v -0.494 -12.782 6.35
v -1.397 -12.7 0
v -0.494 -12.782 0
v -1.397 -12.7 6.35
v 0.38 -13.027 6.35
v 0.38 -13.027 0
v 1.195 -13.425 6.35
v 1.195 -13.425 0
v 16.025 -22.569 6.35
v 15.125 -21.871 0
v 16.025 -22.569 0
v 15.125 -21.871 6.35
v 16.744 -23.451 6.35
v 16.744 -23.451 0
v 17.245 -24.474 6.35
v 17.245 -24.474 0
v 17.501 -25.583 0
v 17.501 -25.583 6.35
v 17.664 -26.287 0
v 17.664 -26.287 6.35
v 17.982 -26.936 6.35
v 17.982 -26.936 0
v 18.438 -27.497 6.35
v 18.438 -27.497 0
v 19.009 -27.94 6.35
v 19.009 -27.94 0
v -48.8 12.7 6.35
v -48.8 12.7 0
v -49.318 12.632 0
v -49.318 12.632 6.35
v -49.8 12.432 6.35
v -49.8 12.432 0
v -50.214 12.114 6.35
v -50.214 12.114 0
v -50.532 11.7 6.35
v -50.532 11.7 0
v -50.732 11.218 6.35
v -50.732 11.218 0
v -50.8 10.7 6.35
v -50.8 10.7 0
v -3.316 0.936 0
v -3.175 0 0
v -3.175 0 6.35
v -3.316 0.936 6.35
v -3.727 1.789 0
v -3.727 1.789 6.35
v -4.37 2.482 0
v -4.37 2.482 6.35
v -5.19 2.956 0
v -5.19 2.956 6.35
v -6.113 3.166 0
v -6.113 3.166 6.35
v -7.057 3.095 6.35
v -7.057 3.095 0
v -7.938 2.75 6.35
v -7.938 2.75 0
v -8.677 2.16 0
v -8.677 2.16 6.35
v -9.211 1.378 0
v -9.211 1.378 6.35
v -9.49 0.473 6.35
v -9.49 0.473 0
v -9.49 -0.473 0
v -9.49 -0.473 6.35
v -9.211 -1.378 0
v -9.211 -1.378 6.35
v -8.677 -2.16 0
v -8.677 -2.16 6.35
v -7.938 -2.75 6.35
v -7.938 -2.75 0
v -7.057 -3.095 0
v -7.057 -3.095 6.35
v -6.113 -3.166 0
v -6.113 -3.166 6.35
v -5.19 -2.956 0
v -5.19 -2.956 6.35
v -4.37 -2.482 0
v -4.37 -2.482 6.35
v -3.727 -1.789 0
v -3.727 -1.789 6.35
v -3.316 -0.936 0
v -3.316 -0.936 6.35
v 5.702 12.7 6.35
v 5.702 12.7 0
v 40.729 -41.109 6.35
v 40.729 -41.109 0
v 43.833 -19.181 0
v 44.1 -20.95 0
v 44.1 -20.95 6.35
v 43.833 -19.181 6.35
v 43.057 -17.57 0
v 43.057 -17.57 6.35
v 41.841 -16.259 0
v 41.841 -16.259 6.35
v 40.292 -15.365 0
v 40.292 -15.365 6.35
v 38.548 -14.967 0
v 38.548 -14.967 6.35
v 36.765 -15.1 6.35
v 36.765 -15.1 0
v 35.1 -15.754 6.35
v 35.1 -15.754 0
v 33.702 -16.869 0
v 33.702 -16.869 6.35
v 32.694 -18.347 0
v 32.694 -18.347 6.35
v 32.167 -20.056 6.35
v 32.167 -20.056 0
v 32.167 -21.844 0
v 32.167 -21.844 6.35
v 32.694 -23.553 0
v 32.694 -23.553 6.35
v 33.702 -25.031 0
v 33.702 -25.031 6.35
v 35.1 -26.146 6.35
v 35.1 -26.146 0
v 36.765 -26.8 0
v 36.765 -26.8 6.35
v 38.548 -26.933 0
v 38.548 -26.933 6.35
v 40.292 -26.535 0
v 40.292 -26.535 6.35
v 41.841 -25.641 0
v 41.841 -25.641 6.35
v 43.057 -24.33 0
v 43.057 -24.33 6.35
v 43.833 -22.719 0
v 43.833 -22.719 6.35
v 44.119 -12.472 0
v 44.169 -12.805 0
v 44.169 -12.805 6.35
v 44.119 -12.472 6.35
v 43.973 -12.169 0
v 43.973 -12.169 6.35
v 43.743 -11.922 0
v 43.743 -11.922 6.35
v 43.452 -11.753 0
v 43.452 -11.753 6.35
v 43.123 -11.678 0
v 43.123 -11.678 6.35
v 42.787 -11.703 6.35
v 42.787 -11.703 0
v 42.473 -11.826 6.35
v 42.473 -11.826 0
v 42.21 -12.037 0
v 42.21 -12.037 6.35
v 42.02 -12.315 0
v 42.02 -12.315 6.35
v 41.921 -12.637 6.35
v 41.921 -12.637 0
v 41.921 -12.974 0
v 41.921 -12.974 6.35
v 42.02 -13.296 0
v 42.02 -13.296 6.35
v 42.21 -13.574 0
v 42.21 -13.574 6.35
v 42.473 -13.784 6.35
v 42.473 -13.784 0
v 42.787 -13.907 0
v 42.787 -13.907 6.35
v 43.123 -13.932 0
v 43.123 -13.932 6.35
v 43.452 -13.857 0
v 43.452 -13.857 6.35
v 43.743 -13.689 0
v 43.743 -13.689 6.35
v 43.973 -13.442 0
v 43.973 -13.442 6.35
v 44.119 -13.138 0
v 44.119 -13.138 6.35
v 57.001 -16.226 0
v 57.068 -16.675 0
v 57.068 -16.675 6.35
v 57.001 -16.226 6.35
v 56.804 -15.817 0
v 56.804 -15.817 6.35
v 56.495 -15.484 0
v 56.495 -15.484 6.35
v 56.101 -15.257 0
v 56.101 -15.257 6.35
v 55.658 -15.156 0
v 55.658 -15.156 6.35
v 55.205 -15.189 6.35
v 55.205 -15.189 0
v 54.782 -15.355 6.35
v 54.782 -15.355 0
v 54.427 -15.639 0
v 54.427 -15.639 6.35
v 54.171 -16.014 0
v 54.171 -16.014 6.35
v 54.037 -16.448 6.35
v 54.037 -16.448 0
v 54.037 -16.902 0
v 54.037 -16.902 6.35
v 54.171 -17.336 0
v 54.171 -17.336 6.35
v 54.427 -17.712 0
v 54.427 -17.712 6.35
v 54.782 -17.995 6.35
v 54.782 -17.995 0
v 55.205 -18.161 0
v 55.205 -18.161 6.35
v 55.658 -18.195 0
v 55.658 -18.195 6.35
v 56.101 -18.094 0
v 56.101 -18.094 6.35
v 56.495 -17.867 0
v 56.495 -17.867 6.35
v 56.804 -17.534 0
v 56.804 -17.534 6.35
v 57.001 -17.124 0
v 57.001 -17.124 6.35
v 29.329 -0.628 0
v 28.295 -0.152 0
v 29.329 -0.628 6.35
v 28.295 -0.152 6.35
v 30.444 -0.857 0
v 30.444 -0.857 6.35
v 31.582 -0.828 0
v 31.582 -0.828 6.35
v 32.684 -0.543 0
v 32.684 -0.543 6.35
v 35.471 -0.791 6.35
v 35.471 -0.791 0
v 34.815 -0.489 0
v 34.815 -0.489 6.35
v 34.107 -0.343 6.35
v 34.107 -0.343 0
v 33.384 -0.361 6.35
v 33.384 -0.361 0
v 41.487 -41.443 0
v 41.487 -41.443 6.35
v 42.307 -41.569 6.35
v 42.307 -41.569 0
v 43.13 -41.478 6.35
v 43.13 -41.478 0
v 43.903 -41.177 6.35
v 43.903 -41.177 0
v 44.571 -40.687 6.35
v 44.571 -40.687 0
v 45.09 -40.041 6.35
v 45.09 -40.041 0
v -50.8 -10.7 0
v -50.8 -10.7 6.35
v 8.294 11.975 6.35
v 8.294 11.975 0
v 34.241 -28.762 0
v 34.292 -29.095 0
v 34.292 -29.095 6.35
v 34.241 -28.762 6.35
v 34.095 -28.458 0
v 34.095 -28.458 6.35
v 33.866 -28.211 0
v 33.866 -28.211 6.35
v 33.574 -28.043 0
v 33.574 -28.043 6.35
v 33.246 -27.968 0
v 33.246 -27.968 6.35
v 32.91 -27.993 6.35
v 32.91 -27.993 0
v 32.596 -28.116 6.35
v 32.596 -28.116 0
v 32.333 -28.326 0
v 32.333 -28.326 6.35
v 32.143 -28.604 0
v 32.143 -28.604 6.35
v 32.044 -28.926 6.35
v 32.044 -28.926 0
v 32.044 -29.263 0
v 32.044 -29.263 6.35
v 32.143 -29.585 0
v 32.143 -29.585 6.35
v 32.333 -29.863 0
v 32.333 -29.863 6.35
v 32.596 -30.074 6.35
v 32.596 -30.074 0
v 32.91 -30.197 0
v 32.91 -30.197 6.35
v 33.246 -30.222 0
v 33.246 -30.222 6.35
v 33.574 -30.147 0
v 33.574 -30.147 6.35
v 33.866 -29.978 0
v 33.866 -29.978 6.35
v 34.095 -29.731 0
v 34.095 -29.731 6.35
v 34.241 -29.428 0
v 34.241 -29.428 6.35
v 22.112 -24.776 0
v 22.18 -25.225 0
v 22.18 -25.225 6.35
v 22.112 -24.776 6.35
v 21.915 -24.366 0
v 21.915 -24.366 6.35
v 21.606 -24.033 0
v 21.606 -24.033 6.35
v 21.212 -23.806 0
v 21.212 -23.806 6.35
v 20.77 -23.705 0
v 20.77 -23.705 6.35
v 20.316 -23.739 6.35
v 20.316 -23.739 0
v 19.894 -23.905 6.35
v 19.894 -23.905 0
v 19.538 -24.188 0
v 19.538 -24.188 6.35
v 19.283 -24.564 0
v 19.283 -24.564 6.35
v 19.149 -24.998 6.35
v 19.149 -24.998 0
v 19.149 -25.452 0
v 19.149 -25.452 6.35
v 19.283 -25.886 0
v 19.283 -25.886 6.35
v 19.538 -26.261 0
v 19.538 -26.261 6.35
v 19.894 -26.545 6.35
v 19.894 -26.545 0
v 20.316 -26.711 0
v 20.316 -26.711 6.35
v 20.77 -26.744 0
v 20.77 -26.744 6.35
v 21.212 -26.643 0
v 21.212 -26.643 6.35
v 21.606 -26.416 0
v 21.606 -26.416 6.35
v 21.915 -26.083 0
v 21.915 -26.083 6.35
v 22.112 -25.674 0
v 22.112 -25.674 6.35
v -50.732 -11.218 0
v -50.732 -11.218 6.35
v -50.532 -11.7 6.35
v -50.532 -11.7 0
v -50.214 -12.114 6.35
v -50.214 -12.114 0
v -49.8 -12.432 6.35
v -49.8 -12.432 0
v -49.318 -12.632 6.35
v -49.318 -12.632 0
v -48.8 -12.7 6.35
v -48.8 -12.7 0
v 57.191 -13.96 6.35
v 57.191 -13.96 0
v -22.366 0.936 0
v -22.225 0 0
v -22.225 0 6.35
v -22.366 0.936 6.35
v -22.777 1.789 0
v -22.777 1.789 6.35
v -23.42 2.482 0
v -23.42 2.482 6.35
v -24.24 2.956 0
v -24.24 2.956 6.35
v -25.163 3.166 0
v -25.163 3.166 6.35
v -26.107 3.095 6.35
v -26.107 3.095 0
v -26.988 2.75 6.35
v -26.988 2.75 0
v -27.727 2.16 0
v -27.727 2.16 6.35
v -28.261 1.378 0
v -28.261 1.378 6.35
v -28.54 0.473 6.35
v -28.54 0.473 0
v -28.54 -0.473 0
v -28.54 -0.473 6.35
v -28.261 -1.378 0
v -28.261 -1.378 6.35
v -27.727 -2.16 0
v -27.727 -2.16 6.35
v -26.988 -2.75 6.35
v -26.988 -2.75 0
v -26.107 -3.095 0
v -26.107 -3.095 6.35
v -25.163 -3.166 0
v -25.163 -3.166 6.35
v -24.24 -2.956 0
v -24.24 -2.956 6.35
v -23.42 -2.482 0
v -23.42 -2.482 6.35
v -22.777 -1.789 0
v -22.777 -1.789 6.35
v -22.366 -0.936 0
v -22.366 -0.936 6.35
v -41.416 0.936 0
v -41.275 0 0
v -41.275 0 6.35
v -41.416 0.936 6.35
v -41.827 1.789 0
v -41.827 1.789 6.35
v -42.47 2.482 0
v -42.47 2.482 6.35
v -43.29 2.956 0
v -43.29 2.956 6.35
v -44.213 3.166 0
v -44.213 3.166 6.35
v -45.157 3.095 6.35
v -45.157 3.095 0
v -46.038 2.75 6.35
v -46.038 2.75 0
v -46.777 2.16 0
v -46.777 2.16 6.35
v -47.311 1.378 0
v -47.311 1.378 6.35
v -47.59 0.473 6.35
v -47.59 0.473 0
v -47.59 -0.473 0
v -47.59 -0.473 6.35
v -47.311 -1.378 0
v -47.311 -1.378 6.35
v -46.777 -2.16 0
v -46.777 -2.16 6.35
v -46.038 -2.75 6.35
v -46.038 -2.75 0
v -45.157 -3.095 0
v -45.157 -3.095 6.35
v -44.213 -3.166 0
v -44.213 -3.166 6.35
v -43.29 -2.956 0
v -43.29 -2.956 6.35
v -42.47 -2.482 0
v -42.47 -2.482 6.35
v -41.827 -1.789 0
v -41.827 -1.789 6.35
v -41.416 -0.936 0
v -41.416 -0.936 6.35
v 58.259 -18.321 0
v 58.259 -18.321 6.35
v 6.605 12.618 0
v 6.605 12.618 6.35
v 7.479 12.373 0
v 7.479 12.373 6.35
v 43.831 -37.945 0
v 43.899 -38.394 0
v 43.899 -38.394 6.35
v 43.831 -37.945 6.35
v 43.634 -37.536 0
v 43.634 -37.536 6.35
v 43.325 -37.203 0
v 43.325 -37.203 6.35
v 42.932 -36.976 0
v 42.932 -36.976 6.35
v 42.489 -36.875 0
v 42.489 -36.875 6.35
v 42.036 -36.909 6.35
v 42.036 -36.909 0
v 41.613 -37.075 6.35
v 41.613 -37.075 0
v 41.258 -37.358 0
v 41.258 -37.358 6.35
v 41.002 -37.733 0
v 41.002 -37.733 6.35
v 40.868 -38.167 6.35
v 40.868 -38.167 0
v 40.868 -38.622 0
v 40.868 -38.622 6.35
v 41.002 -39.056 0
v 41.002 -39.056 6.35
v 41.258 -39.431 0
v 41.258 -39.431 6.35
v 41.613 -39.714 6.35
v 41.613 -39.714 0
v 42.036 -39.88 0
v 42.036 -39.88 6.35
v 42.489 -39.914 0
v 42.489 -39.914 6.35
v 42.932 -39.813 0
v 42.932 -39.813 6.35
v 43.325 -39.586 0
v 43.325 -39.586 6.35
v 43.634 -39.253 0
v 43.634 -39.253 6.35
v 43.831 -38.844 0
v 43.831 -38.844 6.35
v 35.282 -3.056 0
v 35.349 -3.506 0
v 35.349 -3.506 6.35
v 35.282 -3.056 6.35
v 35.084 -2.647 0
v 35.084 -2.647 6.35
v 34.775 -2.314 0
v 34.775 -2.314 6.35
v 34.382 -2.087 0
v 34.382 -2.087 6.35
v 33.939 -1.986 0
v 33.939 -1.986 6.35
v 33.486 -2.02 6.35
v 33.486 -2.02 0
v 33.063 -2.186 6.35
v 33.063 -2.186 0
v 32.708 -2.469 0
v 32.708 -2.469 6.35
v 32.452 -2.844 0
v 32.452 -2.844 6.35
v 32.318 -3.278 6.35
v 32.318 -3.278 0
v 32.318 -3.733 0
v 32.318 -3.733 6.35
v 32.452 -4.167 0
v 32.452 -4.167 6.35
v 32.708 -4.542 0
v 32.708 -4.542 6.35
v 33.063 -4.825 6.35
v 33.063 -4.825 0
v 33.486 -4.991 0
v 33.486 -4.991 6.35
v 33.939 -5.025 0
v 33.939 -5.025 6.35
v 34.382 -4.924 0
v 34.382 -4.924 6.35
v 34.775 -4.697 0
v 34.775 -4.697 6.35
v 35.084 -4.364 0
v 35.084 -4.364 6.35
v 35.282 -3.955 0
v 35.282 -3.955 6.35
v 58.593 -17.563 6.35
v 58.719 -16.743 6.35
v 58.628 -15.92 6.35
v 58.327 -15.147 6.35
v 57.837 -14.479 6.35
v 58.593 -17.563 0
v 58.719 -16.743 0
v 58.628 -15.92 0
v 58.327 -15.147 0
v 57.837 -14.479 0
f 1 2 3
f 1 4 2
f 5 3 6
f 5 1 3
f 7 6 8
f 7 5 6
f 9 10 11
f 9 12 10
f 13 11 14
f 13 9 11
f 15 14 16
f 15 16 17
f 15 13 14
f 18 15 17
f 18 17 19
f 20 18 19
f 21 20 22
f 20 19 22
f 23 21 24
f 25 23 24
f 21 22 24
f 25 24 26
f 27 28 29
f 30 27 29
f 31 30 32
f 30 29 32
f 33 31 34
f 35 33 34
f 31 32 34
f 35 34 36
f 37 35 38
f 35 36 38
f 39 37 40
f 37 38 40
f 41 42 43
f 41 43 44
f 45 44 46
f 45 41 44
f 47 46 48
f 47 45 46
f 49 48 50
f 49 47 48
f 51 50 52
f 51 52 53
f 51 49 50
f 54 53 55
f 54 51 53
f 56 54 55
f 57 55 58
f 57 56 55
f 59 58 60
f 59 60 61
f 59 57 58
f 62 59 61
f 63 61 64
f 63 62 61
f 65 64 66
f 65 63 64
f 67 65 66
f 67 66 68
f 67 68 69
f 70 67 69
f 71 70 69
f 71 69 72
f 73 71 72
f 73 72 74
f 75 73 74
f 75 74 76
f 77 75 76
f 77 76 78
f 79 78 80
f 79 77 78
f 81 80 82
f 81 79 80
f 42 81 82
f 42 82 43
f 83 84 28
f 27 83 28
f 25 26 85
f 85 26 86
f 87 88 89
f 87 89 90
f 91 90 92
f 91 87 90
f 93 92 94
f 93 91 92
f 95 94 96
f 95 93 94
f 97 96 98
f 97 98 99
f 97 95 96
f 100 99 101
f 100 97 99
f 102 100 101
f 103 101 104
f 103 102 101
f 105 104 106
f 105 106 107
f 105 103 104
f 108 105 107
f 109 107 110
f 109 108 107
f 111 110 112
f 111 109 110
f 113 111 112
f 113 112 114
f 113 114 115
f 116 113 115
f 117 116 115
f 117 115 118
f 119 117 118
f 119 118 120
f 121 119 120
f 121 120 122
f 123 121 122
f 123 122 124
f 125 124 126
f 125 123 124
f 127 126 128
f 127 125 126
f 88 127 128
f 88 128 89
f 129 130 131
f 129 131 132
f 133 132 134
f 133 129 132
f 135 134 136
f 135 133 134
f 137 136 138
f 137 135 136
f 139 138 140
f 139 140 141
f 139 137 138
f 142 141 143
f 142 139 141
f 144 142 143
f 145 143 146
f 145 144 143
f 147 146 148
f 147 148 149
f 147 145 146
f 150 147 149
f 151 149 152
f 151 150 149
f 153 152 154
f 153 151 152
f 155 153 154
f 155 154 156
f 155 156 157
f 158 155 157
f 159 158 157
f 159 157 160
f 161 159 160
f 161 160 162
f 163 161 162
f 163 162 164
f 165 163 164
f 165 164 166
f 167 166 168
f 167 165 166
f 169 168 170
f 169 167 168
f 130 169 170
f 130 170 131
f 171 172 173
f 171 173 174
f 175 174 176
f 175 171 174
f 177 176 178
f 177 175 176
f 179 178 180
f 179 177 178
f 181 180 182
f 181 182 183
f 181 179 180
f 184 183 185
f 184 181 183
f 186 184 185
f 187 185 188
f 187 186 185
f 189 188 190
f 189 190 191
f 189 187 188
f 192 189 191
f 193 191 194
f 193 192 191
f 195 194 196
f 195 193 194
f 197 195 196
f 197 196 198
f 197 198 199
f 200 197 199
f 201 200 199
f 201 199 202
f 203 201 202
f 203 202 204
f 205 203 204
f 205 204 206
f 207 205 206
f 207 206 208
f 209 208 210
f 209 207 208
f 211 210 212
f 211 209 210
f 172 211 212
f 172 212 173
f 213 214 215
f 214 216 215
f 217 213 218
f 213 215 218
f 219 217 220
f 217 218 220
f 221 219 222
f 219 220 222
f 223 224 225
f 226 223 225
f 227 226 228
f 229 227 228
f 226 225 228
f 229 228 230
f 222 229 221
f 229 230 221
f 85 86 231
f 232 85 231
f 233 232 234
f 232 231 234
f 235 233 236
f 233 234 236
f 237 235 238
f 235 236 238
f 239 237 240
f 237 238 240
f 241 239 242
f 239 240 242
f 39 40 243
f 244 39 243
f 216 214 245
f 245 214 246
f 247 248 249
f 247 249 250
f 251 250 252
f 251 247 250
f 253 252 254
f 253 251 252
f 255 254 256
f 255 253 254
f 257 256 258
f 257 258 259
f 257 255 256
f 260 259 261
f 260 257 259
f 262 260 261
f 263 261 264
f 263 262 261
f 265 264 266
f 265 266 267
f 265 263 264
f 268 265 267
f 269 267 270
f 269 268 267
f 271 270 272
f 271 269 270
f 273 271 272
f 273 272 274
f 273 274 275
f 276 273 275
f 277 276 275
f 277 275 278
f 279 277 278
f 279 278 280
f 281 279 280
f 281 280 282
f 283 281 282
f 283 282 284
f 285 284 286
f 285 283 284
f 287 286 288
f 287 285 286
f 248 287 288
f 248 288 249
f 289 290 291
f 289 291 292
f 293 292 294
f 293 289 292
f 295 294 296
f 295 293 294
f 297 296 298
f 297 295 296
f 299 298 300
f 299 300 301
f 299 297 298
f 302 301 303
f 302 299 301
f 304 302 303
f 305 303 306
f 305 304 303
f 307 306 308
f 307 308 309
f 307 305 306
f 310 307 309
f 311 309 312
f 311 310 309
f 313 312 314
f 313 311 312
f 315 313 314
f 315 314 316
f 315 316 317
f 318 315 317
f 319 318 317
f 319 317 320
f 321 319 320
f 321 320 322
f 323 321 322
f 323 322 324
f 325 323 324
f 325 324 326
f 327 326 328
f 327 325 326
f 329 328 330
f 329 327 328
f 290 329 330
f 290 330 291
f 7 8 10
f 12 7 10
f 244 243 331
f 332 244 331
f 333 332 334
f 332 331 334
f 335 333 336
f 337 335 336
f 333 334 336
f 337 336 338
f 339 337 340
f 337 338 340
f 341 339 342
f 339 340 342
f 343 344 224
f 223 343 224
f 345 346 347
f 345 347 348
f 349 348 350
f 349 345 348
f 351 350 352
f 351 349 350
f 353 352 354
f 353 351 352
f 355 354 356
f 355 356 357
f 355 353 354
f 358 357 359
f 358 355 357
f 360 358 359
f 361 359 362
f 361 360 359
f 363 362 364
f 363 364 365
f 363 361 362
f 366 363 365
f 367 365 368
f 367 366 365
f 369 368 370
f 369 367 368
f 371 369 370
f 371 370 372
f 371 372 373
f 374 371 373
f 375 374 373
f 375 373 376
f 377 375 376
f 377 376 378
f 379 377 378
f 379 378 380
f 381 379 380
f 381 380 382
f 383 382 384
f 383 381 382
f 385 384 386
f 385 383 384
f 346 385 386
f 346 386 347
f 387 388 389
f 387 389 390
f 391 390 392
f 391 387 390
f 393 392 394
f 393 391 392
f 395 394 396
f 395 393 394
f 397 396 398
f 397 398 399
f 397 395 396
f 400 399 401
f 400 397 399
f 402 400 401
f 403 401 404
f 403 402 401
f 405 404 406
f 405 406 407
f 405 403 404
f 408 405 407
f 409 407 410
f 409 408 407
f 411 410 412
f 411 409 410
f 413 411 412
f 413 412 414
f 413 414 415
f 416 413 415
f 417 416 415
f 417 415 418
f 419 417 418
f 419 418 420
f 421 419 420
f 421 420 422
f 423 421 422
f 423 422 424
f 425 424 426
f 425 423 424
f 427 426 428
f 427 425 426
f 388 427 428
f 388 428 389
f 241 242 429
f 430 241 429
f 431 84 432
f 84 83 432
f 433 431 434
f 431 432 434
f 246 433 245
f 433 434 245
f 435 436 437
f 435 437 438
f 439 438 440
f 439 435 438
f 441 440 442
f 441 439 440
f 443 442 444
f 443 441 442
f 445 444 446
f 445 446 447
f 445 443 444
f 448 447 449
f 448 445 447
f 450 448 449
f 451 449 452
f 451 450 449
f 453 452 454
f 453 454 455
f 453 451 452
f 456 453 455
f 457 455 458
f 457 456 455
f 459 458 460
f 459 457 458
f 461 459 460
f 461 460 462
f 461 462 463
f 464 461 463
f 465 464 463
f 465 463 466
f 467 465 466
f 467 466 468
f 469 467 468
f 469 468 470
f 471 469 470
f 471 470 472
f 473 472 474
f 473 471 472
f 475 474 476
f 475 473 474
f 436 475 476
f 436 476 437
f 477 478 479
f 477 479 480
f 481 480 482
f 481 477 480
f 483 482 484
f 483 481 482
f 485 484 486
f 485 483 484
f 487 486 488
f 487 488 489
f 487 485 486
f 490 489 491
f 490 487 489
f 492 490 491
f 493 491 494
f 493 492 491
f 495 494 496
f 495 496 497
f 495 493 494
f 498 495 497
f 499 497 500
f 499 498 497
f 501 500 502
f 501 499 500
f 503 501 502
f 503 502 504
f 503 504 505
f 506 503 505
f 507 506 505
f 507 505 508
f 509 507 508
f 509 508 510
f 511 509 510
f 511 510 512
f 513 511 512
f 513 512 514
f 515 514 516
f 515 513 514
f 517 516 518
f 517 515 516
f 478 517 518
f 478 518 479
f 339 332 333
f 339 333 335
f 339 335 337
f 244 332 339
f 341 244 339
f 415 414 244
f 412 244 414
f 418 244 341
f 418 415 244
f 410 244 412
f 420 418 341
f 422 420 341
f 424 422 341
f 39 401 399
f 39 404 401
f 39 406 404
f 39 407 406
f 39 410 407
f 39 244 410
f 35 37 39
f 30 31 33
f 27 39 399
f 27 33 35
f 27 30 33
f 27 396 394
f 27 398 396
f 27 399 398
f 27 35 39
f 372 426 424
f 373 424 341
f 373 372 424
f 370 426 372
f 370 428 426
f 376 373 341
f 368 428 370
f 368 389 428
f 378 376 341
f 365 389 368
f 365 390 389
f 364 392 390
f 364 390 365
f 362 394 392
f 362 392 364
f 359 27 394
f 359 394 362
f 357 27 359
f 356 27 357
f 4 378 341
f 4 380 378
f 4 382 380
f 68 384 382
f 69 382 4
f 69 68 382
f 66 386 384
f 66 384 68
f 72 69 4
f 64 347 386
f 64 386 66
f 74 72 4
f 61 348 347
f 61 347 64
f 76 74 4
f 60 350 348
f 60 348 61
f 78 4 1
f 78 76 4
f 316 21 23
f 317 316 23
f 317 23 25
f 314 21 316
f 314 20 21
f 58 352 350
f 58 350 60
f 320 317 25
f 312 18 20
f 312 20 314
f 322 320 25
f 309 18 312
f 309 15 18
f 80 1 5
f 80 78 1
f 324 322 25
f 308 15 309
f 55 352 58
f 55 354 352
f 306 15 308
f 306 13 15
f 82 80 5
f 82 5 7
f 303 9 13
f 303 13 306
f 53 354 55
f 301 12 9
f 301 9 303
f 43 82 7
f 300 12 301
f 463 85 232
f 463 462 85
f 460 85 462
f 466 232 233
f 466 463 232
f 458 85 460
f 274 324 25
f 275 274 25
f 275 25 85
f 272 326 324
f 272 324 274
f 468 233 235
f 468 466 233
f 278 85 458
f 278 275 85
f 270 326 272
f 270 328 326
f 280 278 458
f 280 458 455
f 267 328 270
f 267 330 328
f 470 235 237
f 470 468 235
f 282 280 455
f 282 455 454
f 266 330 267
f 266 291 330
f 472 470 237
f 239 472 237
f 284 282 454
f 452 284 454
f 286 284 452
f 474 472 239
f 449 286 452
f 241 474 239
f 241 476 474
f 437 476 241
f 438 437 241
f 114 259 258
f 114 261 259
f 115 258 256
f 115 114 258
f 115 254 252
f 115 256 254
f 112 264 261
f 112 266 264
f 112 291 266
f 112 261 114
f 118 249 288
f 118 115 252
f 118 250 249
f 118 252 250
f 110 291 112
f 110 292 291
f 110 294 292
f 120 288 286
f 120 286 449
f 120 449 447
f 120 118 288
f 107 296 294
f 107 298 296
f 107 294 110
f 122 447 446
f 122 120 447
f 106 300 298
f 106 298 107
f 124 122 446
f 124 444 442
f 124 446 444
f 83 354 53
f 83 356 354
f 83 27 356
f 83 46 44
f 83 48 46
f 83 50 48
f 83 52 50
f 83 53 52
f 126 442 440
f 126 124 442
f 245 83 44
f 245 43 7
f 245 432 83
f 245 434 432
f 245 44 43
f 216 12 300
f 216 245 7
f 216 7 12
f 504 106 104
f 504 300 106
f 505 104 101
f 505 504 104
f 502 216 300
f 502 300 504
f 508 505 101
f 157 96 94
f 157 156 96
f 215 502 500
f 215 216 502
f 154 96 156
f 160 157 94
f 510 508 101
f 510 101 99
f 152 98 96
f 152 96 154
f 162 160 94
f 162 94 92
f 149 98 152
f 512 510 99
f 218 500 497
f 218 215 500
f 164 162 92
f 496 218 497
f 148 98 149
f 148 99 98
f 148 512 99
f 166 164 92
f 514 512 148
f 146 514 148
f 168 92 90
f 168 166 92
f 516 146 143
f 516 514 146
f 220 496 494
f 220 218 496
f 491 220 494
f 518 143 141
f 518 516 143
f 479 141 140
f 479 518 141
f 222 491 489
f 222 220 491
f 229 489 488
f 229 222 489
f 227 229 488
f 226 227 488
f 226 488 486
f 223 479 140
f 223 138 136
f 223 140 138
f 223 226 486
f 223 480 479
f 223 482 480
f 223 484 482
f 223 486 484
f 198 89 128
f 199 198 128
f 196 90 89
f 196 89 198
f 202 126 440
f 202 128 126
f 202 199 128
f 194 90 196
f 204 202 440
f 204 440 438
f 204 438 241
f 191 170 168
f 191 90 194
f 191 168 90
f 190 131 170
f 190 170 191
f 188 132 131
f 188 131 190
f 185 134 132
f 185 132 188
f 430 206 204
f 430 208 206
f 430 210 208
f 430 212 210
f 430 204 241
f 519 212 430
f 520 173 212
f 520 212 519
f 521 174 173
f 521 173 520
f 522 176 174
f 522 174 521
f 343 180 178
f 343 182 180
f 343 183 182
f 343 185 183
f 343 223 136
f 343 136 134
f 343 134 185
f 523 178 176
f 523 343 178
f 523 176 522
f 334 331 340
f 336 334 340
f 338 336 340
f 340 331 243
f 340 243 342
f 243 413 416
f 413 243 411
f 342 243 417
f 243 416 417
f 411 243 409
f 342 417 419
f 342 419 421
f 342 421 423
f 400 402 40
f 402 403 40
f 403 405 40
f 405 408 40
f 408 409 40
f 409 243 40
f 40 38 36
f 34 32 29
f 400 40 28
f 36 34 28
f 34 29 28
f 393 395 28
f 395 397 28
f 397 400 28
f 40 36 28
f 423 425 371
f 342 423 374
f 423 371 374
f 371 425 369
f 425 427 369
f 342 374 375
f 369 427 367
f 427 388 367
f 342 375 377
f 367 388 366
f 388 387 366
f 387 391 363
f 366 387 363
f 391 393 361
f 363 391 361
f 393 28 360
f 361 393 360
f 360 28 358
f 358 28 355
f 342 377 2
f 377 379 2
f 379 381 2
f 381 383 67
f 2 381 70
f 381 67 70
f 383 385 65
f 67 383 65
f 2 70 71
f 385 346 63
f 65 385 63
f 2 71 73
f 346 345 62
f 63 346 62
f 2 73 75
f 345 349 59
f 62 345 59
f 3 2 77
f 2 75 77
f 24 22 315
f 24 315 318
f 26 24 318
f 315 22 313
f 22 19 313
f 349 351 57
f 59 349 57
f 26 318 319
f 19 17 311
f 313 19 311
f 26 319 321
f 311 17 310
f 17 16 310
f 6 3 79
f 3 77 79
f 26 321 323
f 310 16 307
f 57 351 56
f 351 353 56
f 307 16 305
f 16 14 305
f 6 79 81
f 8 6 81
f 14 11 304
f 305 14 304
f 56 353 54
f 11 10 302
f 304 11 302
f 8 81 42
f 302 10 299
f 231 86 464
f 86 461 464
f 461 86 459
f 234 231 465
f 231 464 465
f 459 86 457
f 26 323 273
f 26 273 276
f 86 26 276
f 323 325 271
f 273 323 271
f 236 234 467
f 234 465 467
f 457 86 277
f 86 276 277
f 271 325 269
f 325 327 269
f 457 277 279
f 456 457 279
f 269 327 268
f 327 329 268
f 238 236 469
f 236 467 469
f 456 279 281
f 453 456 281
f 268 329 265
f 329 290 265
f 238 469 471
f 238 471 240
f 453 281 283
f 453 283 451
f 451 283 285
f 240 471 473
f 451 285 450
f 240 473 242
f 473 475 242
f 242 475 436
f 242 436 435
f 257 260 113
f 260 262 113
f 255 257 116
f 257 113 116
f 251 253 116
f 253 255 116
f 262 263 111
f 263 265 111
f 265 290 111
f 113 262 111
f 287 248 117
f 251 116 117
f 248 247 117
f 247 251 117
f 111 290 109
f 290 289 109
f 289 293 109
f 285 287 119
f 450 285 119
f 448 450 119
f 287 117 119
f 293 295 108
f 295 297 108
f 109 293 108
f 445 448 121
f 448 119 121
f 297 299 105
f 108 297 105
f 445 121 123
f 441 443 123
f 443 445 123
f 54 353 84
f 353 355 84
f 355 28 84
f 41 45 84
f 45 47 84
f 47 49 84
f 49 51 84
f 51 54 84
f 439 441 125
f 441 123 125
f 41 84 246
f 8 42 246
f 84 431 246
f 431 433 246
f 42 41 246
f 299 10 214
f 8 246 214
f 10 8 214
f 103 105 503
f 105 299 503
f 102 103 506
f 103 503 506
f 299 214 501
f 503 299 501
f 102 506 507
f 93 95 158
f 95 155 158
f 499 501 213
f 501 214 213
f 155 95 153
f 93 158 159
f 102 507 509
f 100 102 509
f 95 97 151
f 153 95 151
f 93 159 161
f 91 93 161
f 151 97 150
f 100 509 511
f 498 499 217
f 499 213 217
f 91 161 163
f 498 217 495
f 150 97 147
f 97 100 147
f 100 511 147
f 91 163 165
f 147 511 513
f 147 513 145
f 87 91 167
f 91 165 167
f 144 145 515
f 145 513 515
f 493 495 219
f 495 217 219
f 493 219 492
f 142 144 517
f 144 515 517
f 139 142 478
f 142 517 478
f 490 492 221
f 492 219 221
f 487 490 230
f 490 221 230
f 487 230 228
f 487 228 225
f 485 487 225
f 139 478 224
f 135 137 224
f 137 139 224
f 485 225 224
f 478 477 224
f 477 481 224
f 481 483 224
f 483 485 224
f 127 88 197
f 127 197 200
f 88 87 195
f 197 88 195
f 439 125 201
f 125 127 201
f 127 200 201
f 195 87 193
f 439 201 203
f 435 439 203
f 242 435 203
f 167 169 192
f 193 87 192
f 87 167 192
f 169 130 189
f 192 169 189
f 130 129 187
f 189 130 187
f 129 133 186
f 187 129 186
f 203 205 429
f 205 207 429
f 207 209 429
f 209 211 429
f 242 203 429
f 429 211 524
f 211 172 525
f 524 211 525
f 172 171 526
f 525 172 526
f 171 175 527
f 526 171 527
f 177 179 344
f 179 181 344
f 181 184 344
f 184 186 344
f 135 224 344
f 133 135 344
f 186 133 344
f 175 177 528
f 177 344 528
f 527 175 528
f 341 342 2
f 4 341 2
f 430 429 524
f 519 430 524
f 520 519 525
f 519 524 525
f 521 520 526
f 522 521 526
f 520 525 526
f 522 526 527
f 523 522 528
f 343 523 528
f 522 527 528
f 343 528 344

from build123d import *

# Parameters (mm, degrees)
SKETCH1_R           = 6
SKETCH1_R_2         = 1.1303
SKETCH1_R_3         = 3.175
SKETCH1_R_4         = 1.524
BOSS_EXTRUDE1_DEPTH = 6.35
FILLET1_R           = 5


with BuildPart() as part:
    # Sketch1 → Boss-Extrude1 (new body)
    with BuildSketch(Plane.XY):
        with BuildLine():
            Line((-50.8, 10.7), (-50.8, -10.7))
            ThreePointArc((-50.8, -10.7), (-50.214213562, -12.114213562), (-48.8, -12.7))
            Line((-48.8, -12.7), (0, -12.7))
            Line((0, -12.7), (17.940725429, -23.578549747))
            ThreePointArc((17.940725429, -23.578549747), (17.571857186, -25.980430432), (19.009414234, -27.939645668))
            Line((19.009414234, -27.939645668), (40.728550204, -41.109274848))
            ThreePointArc((40.728550204, -41.109274848), (43.130430599, -41.478142773), (45.089645569, -40.040585929))
            Line((45.089645569, -40.040585929), (58.259274749, -18.321449959))
            ThreePointArc((58.259274749, -18.321449959), (58.628143126, -15.91957084), (57.1905883, -13.960355869))
            Line((57.1905883, -13.960355869), (35.47145233, -0.790726689))
            ThreePointArc((35.47145233, -0.790726689), (33.069571007, -0.421856833), (31.110354609, -1.859413778))
            Line((31.110354609, -1.859413778), (7.099208724, 12.7))
            Line((7.099208724, 12.7), (-48.8, 12.7))
            ThreePointArc((-48.8, 12.7), (-50.214213562, 12.114213562), (-50.8, 10.7))
        make_face()
        with Locations((38.1, -20.95)):
            Circle(SKETCH1_R, mode=Mode.SUBTRACT)
        with Locations((43.038610942, -12.805324011)):
            Circle(SKETCH1_R_2, mode=Mode.SUBTRACT)
        with Locations((33.161389058, -29.094675989)):
            Circle(SKETCH1_R_2, mode=Mode.SUBTRACT)
        with Locations((-6.35, 0)):
            Circle(SKETCH1_R_3, mode=Mode.SUBTRACT)
        with Locations((-25.4, 0)):
            Circle(SKETCH1_R_3, mode=Mode.SUBTRACT)
        with Locations((-44.45, 0)):
            Circle(SKETCH1_R_3, mode=Mode.SUBTRACT)
        with Locations((33.825246605, -3.505617425)):
            Circle(SKETCH1_R_4, mode=Mode.SUBTRACT)
        with Locations((20.655617425, -25.224753395)):
            Circle(SKETCH1_R_4, mode=Mode.SUBTRACT)
        with Locations((42.374753395, -38.394382575)):
            Circle(SKETCH1_R_4, mode=Mode.SUBTRACT)
        with Locations((55.544382575, -16.675246605)):
            Circle(SKETCH1_R_4, mode=Mode.SUBTRACT)
    extrude(amount=BOSS_EXTRUDE1_DEPTH)

    # Fillet1
    fillet1_edges = [part.edges().sort_by_distance(p)[0] for p in [
        (17.940725429, -23.578549747, 3.175),
        (0, -12.7, 3.175),
        (7.099208724, 12.7, 3.175),
        (31.110354609, -1.859413778, 3.175),
    ]]
    fillet(fillet1_edges, radius=FILLET1_R)


solid = part.part
